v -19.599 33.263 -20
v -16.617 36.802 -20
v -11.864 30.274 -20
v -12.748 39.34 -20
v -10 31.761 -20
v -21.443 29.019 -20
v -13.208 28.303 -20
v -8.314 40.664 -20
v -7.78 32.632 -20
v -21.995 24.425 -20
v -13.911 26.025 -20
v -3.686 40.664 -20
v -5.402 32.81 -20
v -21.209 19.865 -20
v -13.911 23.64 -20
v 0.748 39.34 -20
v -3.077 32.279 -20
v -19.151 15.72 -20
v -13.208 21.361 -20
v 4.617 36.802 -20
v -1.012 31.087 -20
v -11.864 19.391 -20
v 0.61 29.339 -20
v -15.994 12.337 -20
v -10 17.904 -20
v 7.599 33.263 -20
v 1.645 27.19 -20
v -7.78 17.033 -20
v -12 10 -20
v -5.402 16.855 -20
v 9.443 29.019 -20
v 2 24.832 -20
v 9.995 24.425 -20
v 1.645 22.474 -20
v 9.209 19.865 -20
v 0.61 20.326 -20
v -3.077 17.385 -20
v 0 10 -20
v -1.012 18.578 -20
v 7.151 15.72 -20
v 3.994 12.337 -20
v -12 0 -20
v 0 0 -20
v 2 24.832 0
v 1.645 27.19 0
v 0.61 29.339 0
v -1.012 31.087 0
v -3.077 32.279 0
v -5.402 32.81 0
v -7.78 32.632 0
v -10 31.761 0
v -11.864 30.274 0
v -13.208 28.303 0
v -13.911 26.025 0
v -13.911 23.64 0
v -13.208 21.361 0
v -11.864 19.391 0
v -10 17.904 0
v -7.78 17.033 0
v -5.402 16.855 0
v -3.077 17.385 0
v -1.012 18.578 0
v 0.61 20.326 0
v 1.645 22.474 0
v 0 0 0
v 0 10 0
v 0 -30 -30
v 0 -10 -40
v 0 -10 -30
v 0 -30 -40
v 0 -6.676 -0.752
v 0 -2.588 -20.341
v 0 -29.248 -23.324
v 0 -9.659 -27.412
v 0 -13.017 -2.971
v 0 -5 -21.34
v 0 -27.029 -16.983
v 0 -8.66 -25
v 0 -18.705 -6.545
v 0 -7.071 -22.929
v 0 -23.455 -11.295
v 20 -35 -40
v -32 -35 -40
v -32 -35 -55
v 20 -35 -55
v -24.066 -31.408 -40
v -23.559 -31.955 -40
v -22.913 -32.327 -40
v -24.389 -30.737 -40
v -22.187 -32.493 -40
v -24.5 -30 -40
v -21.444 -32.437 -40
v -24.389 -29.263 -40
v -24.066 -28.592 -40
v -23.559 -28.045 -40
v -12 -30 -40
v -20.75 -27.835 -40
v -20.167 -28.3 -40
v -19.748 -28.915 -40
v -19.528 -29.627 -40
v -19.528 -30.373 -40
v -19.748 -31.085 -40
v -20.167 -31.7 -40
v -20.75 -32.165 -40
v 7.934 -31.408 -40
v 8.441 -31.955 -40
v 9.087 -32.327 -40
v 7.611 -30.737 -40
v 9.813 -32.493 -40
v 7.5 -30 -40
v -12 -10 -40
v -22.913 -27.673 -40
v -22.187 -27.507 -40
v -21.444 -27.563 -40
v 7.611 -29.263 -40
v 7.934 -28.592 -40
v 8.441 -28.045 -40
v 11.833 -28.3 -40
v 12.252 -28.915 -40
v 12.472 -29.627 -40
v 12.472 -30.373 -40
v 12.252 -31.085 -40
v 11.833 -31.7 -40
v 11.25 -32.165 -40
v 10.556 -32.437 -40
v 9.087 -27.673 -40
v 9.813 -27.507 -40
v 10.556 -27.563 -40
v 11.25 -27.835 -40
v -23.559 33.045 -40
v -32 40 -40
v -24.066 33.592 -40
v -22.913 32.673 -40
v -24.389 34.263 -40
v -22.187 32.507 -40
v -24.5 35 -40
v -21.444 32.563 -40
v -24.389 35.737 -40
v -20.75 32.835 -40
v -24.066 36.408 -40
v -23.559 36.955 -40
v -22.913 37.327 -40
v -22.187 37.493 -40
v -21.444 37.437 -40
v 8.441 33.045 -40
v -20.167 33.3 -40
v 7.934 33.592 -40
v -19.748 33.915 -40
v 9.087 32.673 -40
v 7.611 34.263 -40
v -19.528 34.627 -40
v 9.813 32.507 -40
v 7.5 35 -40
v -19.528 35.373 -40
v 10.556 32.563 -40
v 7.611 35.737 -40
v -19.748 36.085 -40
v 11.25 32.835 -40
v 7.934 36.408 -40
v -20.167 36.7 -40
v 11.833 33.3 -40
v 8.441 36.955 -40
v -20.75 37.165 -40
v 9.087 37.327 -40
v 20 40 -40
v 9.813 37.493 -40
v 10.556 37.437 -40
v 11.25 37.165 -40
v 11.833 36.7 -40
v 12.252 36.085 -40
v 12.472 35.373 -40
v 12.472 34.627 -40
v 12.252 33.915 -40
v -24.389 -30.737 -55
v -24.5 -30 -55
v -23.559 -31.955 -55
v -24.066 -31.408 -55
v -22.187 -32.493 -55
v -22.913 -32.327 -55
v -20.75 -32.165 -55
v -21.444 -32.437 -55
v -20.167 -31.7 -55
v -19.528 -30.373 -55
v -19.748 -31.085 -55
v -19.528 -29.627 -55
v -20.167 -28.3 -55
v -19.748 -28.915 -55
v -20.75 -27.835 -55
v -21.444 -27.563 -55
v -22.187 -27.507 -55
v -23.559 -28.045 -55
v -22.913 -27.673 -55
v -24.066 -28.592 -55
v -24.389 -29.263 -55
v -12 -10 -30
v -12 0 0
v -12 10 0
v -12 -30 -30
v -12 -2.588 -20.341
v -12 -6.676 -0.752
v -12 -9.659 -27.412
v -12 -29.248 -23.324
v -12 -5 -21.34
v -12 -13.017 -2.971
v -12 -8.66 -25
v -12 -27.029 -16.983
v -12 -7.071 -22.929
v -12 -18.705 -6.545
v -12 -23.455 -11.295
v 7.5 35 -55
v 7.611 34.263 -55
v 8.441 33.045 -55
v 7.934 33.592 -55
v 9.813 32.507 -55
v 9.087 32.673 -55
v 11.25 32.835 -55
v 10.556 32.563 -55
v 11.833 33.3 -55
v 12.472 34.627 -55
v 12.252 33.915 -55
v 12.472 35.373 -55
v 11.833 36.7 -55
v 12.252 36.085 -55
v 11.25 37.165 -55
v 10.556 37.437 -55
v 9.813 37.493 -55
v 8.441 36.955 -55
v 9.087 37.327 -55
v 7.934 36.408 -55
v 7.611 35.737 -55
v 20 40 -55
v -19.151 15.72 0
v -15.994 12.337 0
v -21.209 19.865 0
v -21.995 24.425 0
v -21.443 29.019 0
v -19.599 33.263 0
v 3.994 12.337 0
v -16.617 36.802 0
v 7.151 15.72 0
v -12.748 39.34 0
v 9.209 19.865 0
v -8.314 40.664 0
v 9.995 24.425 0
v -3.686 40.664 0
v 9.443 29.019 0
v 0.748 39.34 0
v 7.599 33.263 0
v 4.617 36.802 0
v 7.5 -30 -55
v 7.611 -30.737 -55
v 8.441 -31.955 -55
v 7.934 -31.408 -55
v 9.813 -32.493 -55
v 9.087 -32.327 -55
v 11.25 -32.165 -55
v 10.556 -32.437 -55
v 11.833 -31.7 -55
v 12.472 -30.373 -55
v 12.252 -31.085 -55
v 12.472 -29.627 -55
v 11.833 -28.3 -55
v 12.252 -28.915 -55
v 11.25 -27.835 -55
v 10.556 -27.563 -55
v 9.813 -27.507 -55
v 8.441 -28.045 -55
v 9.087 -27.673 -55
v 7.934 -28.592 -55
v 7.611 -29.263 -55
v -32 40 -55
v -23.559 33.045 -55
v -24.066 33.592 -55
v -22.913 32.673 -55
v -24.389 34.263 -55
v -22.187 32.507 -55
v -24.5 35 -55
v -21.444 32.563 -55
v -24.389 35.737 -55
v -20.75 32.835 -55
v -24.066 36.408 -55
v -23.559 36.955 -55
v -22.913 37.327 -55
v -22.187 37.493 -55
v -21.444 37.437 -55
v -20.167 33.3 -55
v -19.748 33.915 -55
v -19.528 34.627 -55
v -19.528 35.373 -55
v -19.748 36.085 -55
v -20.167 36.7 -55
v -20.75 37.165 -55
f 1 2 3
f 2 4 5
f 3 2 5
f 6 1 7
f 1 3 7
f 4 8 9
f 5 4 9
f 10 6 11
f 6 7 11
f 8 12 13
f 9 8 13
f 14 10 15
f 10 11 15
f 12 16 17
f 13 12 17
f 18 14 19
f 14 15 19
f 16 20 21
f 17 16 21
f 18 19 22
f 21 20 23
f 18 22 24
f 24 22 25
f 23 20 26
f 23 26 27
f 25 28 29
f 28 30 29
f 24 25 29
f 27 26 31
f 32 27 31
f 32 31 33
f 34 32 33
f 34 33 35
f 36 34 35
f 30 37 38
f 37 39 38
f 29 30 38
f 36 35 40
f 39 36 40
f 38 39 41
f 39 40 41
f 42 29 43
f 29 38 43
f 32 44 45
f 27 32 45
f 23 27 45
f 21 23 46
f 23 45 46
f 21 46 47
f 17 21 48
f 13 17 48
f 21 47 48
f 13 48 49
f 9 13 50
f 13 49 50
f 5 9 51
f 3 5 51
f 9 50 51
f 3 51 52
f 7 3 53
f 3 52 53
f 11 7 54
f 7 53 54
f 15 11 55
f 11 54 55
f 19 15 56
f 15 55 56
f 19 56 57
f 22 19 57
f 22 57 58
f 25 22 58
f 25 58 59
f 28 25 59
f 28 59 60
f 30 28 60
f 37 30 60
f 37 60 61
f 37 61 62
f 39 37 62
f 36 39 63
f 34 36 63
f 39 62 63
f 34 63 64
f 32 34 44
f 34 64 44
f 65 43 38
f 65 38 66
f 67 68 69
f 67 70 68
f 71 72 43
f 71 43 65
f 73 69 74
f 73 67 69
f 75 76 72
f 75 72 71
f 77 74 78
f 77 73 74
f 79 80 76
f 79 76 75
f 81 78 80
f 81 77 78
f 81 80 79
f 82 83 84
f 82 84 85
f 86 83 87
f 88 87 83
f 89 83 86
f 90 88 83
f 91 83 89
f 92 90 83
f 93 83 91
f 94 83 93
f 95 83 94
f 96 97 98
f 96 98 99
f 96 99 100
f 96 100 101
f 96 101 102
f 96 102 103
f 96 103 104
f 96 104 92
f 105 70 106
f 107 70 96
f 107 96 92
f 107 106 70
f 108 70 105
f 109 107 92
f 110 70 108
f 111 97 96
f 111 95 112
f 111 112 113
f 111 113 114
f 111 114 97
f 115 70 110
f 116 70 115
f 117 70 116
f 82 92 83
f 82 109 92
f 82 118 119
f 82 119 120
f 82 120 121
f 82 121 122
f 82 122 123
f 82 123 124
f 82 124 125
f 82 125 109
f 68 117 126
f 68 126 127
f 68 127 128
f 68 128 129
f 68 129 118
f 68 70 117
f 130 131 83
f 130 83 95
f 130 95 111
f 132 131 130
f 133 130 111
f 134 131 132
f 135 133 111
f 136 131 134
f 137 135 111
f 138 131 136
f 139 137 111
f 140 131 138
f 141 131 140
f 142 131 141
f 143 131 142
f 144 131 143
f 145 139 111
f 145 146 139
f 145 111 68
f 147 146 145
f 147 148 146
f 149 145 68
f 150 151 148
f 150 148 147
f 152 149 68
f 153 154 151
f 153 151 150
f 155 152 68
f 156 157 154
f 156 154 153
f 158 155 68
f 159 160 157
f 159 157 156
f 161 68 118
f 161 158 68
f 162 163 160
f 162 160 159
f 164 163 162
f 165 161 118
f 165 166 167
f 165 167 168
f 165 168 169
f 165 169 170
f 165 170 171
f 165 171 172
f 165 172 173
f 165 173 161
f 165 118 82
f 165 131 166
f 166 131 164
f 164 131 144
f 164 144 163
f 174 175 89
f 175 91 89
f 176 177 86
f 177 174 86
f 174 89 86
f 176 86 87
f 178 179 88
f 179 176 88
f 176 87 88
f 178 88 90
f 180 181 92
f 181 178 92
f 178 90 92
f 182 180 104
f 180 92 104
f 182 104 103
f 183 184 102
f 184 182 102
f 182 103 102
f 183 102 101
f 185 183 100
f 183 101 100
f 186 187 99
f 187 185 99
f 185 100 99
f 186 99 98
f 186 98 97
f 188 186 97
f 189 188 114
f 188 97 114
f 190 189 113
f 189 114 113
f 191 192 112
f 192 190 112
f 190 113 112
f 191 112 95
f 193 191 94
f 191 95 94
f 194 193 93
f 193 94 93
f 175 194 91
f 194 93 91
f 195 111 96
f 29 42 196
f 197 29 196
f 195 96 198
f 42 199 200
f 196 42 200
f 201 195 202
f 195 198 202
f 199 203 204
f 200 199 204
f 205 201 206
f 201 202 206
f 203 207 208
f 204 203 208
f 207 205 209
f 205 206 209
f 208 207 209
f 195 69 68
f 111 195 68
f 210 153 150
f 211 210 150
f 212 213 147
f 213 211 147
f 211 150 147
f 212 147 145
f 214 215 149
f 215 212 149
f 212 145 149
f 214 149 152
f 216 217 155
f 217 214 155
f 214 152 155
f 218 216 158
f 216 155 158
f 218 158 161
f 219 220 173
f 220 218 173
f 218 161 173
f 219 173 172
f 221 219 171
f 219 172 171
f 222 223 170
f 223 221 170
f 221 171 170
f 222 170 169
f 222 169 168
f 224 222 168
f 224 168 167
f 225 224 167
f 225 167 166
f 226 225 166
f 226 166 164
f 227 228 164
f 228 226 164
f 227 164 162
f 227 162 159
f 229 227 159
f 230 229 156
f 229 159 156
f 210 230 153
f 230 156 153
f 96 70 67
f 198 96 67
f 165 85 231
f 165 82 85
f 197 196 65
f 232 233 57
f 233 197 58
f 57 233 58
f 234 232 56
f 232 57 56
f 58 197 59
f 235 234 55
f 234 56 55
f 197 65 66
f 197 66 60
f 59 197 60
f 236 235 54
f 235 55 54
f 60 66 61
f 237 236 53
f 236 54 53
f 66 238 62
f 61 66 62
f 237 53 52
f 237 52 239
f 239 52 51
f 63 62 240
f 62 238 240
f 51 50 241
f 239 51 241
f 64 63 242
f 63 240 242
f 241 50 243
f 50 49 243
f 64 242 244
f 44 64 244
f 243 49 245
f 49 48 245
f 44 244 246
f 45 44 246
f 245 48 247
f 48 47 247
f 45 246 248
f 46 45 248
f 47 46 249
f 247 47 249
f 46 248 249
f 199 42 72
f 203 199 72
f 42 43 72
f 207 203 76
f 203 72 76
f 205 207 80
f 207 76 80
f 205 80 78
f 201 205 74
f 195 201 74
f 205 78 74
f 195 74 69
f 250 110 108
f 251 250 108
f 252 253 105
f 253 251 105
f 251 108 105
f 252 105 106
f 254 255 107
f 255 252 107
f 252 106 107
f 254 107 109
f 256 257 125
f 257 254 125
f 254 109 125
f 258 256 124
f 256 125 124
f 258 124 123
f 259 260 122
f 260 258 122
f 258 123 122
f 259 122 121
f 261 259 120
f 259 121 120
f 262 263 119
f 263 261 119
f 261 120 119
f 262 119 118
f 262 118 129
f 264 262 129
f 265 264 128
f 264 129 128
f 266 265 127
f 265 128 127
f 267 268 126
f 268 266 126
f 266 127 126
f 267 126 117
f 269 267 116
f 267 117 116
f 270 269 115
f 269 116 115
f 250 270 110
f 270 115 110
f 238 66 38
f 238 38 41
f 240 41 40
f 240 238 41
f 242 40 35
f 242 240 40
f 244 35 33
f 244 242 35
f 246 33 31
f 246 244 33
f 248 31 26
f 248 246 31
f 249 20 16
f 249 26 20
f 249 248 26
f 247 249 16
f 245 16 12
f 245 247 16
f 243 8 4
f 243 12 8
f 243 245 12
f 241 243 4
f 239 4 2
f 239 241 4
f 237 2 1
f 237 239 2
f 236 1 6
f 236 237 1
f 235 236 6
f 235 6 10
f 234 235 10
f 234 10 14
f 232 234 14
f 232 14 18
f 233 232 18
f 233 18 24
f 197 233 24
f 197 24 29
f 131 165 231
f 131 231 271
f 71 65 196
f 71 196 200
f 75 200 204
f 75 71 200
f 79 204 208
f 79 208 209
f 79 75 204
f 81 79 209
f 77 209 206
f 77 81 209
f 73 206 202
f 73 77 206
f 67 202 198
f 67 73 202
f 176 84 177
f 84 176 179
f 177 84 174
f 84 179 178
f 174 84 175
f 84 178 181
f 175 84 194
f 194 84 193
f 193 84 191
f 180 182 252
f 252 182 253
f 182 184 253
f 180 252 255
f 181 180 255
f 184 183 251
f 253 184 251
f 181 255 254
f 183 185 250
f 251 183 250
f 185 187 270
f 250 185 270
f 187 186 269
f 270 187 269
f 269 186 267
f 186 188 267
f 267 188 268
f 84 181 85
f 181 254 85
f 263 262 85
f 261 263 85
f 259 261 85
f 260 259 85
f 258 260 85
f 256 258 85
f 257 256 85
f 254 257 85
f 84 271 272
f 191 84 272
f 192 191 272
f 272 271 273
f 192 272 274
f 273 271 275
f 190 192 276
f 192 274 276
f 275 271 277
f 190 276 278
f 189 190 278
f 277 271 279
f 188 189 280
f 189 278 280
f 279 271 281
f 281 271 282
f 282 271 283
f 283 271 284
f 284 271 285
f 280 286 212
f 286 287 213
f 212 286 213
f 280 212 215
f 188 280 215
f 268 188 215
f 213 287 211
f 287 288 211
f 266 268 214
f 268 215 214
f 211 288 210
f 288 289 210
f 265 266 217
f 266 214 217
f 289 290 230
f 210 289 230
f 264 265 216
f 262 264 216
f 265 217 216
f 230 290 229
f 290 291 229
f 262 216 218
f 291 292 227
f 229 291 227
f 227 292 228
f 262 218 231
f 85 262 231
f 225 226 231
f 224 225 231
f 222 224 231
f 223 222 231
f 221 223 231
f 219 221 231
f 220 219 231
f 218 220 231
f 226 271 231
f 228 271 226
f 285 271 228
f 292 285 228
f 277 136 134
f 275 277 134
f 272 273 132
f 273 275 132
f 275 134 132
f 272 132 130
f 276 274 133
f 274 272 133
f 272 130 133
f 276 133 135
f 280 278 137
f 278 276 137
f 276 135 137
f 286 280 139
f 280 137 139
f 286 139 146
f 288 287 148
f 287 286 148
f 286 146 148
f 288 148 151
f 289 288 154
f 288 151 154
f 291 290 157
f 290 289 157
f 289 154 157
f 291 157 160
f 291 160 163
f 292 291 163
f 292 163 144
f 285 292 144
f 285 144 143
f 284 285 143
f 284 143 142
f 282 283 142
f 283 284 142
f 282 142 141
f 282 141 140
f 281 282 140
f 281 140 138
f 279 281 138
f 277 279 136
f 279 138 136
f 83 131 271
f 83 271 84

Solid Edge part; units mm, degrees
sketch "Sketch1" plane through (0, 0, 0) normal (1, 0, 0) x (0, 1, 0)
  arc A0 (0, 0) -> (-30, -30) centre (0, -30) ccw
  line L0 (-30, -40) -> (-30, -30)
  line L1 (-10, -40) -> (-30, -40)
  line L2 (-10, -30) -> (-10, -40)
  arc A1 (0, -20) -> (-10, -30) centre (0, -30) ccw
  line L3 (10, -20) -> (0, -20)
  line L4 (10, 0) -> (10, -20)
  line L5 (0, 0) -> (10, 0)
extrude "Protrusion1" add sketch "Sketch1" against normal blind 12
sketch "Sketch2" plane through (0, 0, 0) normal (0, 0, 1) x (1, 0, 0)
  line L0 (0, 10) -> (-12, 10)
  arc A0 (-12, 10) -> (0, 10) centre (-6, 24.8324) cw
  circle A1 centre (-6, 24.8324) radius 8
extrude "ExtrudedProtrusion_3" add sketch "Sketch2" against normal blind 20
sketch "Sketch3" plane through (-6, -20, -40) normal (0, 0, -1) x (-1, 0, 0)
  line L0 (-26, 60) -> (26, 60)
  line L1 (26, 60) -> (26, -15)
  line L2 (26, -15) -> (0, -15)
  line L3 (0, -15) -> (-26, -15)
  line L4 (-26, -15) -> (-26, -5)
  line L5 (-26, -5) -> (-26, 50)
  line L6 (-26, 50) -> (-26, 60)
extrude "ExtrudedProtrusion_4" add sketch "Sketch3" along normal blind 15
sketch "Sketch4" plane through (-6, -20, -40) normal (0, 0, -1) x (-1, 0, 0)
  circle A0 centre (16, 55) radius 2.5
  circle A1 centre (-16, 55) radius 2.5
  circle A2 centre (-16, -10) radius 2.5
  circle A3 centre (16, -10) radius 2.5
extrude "ExtrudedCutout_1" cut sketch "Sketch4" along normal blind 15
